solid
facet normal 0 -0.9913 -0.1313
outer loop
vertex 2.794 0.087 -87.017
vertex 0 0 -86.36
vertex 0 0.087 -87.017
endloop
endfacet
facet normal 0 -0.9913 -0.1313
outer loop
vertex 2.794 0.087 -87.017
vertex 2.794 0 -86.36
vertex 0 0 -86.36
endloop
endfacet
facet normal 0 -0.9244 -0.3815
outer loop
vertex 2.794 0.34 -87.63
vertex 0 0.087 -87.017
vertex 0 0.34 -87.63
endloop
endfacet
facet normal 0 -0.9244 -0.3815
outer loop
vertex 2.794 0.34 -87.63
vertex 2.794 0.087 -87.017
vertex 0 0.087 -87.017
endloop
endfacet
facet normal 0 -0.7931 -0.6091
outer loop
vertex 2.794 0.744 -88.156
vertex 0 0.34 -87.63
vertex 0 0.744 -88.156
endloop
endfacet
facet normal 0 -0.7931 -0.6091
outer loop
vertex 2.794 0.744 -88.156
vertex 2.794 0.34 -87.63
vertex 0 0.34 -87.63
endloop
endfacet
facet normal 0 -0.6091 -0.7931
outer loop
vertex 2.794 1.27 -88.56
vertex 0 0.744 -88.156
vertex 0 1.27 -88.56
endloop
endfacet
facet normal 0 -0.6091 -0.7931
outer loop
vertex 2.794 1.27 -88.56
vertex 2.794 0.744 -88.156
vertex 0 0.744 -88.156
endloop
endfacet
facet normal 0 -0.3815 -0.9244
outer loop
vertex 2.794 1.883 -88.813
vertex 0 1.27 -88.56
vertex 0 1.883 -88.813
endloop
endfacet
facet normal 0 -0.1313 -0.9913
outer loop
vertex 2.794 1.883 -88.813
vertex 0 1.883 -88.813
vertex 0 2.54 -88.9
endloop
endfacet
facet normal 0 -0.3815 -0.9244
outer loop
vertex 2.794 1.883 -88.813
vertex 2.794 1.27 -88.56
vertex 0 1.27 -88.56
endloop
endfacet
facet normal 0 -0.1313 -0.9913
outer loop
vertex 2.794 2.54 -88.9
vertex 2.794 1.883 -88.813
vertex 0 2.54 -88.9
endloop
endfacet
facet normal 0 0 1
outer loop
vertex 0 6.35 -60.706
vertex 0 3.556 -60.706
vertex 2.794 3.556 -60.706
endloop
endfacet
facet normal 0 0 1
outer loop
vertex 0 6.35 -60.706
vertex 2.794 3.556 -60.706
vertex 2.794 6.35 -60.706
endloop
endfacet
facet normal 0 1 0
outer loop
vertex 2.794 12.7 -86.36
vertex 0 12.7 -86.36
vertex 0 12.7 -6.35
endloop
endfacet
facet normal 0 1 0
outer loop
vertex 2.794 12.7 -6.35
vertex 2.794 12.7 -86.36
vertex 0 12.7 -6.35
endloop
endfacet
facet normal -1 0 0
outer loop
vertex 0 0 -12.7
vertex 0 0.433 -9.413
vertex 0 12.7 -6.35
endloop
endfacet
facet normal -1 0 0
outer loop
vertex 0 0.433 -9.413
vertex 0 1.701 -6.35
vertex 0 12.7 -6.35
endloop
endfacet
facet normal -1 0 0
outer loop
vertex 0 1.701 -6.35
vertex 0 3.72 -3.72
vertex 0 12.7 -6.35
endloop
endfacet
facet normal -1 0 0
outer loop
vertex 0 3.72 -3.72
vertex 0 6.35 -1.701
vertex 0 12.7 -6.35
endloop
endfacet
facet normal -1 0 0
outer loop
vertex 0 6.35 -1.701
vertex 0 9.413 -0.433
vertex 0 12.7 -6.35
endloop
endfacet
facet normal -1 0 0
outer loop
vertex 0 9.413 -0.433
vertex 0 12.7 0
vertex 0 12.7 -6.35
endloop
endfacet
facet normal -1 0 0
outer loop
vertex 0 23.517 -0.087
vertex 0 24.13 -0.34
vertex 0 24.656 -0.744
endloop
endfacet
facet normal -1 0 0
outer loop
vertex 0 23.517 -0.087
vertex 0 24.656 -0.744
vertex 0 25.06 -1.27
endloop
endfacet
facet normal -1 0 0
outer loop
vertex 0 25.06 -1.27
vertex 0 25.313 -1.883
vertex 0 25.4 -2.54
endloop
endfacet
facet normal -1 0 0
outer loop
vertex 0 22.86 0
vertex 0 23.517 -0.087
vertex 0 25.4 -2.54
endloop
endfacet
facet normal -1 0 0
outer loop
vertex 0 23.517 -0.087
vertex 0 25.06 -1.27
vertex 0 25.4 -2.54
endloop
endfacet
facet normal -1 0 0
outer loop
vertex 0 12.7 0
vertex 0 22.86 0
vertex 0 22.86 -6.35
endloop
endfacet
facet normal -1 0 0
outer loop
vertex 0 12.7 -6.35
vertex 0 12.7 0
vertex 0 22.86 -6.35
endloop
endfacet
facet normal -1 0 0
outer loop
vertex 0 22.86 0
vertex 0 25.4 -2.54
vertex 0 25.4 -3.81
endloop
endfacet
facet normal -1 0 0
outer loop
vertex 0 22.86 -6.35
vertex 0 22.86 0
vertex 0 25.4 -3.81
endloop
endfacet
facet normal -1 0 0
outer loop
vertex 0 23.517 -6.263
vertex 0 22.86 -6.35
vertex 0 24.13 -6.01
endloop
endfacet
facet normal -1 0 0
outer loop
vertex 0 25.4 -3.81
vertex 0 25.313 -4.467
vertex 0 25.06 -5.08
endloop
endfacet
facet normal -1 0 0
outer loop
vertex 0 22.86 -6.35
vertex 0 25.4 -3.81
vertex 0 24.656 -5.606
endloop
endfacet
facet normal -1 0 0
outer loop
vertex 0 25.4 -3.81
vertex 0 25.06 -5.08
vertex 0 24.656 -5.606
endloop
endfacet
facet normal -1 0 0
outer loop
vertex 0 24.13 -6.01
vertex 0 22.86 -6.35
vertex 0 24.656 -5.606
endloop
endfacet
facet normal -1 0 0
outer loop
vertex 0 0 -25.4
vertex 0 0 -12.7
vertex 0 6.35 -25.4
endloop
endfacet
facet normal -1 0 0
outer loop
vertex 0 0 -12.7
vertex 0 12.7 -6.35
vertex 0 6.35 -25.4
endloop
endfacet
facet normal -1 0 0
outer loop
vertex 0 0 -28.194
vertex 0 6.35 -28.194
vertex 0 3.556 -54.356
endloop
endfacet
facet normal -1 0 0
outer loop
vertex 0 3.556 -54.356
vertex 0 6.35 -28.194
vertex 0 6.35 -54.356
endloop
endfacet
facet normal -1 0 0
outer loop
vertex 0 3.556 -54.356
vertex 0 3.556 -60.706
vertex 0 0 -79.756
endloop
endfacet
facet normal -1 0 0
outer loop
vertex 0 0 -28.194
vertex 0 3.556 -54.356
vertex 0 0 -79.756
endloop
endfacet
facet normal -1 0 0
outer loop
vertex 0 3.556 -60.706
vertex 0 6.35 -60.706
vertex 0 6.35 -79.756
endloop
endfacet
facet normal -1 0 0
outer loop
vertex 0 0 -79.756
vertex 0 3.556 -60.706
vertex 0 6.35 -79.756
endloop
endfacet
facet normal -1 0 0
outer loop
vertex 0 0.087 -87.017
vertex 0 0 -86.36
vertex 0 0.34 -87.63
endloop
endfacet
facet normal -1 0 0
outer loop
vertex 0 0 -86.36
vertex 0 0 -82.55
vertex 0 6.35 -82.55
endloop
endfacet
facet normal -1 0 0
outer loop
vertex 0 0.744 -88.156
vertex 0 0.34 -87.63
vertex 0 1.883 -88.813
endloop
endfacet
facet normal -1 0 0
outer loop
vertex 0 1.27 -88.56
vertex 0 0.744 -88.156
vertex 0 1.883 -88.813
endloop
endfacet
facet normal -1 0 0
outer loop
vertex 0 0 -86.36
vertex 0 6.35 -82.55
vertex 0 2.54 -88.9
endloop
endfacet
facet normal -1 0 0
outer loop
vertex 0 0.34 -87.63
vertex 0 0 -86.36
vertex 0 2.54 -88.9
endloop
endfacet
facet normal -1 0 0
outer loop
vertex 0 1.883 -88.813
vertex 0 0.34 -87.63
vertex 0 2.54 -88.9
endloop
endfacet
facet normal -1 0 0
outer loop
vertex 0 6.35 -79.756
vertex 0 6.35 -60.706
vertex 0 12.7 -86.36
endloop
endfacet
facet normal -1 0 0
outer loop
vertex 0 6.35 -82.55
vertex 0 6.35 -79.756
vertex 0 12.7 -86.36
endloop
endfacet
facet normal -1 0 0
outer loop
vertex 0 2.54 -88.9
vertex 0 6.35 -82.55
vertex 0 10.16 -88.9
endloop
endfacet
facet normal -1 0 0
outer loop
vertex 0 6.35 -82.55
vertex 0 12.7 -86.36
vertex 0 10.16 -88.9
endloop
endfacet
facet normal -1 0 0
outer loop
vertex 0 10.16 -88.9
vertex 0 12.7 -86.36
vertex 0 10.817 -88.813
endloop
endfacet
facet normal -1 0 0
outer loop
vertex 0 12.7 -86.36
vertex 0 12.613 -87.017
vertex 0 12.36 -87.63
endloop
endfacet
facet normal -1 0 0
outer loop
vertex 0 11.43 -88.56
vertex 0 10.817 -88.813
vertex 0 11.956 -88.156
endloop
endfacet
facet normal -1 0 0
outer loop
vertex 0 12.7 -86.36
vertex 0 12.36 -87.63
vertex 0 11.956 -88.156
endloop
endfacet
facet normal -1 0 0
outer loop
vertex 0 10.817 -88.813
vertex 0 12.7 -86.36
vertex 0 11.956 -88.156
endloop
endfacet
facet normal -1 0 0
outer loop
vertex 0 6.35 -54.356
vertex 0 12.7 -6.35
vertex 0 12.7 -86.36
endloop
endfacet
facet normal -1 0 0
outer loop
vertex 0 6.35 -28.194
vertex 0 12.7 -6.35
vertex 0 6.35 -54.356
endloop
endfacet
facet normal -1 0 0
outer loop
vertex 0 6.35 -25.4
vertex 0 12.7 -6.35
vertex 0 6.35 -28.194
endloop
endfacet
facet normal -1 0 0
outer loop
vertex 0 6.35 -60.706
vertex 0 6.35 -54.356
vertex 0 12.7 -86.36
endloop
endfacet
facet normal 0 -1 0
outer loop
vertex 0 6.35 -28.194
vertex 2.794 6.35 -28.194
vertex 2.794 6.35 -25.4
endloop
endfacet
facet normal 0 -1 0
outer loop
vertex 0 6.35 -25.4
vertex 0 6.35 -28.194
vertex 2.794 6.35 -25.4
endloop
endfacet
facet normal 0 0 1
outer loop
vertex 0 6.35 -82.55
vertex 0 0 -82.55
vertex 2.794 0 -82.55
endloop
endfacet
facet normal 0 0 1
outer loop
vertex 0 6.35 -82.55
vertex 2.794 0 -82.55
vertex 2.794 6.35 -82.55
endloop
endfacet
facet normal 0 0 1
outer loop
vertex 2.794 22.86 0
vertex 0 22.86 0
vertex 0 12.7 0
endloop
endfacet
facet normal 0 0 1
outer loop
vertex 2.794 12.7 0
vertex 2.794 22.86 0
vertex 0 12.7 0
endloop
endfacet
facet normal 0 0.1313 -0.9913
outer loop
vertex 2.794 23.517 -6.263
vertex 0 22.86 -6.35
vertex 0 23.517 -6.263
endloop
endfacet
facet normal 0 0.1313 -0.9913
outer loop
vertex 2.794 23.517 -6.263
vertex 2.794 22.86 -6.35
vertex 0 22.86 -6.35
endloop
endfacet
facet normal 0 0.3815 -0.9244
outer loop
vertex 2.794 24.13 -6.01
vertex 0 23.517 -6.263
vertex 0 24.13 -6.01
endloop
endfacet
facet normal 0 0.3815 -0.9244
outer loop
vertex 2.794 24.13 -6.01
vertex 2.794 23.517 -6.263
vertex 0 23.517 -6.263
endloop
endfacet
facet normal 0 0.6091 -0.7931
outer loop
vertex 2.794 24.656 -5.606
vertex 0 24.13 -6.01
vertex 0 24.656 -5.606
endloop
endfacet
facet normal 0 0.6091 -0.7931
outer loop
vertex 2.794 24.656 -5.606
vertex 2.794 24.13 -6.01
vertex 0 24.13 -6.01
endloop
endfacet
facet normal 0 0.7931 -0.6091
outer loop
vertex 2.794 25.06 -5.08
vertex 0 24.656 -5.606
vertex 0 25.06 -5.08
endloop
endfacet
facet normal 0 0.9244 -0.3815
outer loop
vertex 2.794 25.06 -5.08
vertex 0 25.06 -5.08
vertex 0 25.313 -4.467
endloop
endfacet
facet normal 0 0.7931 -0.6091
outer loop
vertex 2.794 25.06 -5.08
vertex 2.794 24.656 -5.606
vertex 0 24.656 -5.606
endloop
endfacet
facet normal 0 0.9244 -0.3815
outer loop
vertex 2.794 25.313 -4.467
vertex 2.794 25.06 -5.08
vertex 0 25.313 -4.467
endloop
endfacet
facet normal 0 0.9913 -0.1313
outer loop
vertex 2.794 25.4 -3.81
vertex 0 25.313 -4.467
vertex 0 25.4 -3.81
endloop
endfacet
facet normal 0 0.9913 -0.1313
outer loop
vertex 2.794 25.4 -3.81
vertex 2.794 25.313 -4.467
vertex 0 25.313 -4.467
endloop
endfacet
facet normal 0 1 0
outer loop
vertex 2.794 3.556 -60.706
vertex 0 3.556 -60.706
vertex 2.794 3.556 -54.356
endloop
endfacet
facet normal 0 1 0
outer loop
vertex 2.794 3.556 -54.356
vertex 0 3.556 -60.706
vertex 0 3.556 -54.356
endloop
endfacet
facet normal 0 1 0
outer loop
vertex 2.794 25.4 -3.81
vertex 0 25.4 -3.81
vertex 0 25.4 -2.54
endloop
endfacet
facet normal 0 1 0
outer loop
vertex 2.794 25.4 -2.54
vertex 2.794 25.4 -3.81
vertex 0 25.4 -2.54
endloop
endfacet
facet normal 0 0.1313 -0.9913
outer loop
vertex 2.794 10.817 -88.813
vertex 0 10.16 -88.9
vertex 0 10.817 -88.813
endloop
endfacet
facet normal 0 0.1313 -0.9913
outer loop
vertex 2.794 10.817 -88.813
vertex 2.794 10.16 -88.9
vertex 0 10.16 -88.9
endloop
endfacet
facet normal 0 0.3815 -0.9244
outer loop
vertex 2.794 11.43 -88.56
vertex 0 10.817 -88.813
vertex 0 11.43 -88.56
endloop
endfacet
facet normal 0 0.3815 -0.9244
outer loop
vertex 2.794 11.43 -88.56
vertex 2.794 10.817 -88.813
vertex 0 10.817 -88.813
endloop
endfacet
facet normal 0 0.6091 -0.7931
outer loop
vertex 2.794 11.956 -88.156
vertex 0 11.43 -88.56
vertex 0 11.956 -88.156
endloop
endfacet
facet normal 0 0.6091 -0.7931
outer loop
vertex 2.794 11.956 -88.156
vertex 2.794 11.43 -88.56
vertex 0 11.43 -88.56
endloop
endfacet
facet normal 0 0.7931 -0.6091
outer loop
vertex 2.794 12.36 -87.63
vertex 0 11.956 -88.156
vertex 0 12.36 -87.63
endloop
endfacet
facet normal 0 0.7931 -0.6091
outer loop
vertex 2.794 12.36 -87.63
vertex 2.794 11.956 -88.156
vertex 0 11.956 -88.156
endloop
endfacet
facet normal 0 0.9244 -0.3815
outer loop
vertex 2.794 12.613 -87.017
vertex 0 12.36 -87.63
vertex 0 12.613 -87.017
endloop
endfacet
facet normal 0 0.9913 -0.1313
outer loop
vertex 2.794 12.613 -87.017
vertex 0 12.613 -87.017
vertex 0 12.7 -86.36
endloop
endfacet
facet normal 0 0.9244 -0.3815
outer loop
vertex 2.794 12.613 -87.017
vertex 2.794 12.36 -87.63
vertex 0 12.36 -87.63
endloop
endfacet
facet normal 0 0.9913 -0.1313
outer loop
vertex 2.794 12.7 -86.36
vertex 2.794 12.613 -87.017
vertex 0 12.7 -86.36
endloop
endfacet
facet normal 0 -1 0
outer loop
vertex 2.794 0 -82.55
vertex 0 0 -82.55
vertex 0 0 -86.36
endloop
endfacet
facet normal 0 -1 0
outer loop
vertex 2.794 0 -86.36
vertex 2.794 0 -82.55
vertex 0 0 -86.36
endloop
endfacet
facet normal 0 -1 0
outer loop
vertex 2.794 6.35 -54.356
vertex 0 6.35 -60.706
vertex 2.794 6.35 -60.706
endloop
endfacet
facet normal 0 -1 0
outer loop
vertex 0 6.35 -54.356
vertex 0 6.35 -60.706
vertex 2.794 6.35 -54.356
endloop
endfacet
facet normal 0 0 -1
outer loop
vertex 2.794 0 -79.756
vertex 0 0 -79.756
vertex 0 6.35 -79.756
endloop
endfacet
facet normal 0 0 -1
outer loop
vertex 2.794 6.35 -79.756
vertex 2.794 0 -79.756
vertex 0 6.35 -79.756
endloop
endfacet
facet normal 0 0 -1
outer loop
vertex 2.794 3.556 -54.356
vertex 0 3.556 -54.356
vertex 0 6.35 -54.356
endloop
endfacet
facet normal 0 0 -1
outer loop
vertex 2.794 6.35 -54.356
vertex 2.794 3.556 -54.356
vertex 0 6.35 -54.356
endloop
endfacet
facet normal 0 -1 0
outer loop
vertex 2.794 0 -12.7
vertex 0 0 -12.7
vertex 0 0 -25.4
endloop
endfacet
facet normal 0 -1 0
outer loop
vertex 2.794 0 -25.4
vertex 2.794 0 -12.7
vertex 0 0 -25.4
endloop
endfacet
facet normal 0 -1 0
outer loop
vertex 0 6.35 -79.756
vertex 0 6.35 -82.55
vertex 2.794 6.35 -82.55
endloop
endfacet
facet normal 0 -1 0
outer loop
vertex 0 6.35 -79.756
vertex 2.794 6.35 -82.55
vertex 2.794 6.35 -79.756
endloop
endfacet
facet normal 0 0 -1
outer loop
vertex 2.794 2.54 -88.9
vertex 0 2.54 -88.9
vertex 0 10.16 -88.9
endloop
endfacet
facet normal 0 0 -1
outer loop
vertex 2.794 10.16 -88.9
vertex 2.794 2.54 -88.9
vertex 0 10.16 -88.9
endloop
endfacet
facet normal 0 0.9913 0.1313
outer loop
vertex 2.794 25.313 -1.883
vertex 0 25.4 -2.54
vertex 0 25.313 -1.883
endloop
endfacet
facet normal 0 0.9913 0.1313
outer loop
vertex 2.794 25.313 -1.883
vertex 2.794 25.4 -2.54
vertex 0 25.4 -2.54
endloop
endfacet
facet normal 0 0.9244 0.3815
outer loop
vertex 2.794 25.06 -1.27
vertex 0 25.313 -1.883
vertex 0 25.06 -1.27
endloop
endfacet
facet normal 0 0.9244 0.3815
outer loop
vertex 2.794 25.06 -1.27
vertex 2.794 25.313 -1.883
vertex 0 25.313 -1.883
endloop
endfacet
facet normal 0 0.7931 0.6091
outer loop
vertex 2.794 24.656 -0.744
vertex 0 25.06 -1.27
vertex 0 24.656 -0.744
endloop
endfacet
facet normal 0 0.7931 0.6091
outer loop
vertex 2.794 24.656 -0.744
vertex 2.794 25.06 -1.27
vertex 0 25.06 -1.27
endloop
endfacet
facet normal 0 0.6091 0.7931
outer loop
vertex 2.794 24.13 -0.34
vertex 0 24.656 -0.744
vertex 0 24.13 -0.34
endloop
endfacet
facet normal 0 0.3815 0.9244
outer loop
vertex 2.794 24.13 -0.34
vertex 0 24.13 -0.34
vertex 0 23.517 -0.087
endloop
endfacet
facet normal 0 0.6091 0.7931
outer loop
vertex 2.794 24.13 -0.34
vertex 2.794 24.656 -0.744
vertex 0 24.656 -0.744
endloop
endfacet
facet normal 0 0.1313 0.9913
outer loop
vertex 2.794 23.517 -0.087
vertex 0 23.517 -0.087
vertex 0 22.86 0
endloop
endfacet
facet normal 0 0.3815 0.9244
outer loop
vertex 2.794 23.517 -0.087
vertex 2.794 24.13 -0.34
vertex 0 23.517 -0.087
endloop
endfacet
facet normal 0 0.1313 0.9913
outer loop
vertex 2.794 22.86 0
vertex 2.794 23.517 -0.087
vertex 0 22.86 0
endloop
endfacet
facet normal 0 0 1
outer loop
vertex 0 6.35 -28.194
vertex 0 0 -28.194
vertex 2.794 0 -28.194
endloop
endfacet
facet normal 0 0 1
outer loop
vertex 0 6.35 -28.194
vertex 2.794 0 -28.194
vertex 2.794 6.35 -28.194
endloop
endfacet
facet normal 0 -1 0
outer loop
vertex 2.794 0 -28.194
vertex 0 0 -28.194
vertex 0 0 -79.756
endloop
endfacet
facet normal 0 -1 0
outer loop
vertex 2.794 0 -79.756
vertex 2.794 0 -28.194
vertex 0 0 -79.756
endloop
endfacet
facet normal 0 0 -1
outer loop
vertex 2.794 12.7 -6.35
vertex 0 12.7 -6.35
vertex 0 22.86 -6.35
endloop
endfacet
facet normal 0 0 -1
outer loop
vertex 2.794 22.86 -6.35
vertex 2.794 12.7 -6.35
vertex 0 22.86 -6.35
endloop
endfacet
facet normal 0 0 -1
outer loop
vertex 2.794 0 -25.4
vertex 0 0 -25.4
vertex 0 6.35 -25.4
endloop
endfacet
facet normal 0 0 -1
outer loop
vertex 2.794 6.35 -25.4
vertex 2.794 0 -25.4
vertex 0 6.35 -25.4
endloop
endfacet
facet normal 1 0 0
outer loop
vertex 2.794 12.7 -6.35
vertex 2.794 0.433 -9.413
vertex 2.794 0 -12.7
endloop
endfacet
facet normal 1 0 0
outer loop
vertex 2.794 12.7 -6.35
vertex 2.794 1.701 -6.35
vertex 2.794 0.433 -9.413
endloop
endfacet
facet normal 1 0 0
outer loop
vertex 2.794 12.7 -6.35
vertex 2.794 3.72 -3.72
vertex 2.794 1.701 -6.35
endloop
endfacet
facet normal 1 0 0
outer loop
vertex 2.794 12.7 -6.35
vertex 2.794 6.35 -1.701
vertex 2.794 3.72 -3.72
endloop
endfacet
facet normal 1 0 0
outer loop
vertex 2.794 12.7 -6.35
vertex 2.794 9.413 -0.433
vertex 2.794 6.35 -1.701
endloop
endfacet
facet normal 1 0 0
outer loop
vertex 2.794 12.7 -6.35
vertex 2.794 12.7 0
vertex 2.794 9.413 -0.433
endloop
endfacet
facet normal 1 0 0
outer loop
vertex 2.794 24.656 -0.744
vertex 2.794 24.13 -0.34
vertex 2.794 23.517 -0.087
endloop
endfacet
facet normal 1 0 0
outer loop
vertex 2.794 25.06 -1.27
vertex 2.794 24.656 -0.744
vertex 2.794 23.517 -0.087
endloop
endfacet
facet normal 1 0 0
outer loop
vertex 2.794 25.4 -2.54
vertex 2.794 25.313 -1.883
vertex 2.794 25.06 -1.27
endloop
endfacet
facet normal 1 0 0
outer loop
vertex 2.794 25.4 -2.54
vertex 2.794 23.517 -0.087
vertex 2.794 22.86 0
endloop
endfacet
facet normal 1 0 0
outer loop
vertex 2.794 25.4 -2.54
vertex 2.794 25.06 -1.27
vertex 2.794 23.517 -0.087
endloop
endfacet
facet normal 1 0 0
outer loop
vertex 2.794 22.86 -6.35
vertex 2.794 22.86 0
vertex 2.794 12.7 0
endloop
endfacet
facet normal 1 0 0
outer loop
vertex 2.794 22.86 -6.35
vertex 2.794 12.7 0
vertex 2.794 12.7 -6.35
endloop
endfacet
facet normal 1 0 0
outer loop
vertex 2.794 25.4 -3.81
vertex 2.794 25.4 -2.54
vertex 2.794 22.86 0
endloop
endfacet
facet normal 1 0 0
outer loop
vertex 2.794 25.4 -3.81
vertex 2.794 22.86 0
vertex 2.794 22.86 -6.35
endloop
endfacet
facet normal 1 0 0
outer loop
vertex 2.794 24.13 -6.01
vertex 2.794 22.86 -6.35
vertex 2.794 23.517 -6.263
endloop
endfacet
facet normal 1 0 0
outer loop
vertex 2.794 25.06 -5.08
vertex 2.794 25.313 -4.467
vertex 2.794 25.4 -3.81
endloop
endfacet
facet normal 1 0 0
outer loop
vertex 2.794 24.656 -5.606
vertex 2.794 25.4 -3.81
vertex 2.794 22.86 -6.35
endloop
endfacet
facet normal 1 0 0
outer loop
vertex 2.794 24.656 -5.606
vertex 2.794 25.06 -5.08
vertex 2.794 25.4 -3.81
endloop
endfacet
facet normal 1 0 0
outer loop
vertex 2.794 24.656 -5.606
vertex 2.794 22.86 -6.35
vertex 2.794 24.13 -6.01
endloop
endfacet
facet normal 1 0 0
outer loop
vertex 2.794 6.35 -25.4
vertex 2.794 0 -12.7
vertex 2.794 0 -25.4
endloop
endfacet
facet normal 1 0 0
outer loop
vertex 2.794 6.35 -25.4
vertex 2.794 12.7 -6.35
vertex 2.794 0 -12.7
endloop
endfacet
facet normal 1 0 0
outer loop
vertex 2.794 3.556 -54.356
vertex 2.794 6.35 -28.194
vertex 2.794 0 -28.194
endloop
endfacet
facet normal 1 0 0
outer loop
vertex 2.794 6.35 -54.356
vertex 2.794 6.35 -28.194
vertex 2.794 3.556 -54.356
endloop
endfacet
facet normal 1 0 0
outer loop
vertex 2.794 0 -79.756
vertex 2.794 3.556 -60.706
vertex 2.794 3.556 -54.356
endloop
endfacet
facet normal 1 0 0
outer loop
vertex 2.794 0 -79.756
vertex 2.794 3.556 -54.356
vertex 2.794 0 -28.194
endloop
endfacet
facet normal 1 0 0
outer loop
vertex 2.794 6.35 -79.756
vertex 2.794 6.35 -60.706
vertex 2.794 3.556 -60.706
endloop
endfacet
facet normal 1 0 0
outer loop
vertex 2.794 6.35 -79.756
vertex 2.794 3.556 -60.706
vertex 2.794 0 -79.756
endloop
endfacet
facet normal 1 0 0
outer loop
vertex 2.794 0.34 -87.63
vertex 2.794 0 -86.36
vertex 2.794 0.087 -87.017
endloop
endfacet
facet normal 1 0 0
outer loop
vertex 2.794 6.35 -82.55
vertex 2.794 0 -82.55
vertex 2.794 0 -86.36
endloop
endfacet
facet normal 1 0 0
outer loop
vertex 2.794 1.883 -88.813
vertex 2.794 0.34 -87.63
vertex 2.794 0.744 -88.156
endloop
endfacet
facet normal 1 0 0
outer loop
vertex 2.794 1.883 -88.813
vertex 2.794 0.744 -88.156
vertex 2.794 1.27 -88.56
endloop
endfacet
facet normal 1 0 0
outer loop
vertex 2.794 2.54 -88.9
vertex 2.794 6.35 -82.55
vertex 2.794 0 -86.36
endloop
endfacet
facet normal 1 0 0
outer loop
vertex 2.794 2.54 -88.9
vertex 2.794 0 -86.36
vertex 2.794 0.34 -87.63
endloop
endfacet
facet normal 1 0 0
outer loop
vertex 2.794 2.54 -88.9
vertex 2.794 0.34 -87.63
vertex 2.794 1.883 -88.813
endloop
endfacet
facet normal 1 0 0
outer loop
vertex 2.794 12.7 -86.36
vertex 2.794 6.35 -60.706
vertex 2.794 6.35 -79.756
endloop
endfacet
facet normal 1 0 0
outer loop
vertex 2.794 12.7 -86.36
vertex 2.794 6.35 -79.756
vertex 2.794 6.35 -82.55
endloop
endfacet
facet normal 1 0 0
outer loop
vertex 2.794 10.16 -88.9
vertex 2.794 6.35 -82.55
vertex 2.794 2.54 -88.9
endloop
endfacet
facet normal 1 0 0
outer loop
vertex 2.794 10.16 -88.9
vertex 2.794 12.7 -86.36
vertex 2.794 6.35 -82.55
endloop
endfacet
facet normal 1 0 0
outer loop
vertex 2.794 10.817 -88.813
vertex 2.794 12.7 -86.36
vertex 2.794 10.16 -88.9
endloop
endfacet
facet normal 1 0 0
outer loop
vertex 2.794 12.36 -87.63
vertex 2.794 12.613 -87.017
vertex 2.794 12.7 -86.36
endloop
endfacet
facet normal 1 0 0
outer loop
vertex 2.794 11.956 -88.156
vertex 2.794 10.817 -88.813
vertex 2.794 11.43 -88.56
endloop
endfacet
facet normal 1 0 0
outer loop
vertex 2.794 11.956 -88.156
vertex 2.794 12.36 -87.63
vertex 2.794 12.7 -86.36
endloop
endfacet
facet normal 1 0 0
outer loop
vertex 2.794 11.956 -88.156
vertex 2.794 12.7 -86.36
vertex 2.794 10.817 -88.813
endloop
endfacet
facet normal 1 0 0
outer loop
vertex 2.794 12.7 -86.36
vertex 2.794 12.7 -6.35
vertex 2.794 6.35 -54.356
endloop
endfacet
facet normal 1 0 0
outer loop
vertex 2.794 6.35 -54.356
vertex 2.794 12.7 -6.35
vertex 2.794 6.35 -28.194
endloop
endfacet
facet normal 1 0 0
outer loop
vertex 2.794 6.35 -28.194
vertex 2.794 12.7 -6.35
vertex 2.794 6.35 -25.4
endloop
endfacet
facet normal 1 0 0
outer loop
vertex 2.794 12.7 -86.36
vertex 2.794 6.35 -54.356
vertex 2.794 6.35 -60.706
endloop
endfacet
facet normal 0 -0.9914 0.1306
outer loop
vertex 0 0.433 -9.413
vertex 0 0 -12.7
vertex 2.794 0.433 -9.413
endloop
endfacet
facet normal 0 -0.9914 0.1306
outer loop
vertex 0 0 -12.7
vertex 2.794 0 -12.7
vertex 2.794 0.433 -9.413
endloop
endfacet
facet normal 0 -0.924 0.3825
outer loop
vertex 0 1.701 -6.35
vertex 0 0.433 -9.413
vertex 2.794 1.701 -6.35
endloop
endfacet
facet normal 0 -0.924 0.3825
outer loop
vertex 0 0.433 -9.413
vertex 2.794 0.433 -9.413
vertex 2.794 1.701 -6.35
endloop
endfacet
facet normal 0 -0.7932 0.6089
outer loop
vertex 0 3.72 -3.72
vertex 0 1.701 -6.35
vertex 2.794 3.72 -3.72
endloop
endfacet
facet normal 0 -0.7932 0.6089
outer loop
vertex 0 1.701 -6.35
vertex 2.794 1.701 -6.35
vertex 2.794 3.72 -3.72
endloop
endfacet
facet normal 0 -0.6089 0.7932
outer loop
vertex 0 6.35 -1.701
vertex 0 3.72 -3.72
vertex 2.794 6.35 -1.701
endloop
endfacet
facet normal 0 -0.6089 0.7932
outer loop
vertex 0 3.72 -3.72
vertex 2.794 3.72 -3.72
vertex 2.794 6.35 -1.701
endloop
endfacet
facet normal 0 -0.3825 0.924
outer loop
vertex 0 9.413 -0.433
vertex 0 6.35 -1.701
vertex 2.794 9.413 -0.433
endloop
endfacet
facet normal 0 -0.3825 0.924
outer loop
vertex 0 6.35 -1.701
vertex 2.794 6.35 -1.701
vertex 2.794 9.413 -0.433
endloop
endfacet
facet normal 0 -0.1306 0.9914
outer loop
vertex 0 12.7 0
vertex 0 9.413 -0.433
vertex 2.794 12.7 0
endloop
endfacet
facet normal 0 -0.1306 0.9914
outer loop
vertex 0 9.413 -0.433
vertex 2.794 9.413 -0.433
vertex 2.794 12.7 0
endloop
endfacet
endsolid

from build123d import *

# Parameters (mm, degrees)
BOSS_EXTRUDE1_DEPTH = 2.794
FILLET1_R           = 2.54
FILLET2_R           = 12.7
SKETCH2_W           = 2.794
SKETCH2_H           = 6.35
SKETCH2_W_2         = 6.35
SKETCH2_H_2         = 2.794
CUT_EXTRUDE1_DEPTH  = 93.499602356


with BuildPart() as part:
    # Sketch1 → Boss-Extrude1 (new body)
    with BuildSketch(Plane(origin=(0, 0, 0), x_dir=(0, 0, -1), z_dir=(1, 0, 0))):
        Polygon((0, 0), (88.9, 0), (88.9, 12.7), (6.35, 12.7), (6.35, 25.4), (0, 25.4), align=None)
    extrude(amount=BOSS_EXTRUDE1_DEPTH)

    # Fillet1
    fillet1_edges = [part.edges().sort_by_distance(p)[0] for p in [
        (1.397, 25.4, 0),
        (1.397, 25.4, -6.35),
        (1.397, 12.7, -88.9),
        (1.397, 0, -88.9),
    ]]
    fillet(fillet1_edges, radius=FILLET1_R)

    # Fillet2
    fillet2_edges = [part.edges().sort_by_distance(p)[0] for p in [
        (1.397, 0, 0),
    ]]
    fillet(fillet2_edges, radius=FILLET2_R)

    # Sketch2 → Cut-Extrude1 (cut, through all)
    with BuildSketch(Plane.ZY):
        with Locations((-26.797, 3.175)):
            Rectangle(SKETCH2_W, SKETCH2_H)
        with Locations((-81.153, 3.175)):
            Rectangle(SKETCH2_W, SKETCH2_H)
        with Locations((-57.531, 4.953)):
            Rectangle(SKETCH2_W_2, SKETCH2_H_2)
    extrude(amount=-CUT_EXTRUDE1_DEPTH, mode=Mode.SUBTRACT)


solid = part.part
